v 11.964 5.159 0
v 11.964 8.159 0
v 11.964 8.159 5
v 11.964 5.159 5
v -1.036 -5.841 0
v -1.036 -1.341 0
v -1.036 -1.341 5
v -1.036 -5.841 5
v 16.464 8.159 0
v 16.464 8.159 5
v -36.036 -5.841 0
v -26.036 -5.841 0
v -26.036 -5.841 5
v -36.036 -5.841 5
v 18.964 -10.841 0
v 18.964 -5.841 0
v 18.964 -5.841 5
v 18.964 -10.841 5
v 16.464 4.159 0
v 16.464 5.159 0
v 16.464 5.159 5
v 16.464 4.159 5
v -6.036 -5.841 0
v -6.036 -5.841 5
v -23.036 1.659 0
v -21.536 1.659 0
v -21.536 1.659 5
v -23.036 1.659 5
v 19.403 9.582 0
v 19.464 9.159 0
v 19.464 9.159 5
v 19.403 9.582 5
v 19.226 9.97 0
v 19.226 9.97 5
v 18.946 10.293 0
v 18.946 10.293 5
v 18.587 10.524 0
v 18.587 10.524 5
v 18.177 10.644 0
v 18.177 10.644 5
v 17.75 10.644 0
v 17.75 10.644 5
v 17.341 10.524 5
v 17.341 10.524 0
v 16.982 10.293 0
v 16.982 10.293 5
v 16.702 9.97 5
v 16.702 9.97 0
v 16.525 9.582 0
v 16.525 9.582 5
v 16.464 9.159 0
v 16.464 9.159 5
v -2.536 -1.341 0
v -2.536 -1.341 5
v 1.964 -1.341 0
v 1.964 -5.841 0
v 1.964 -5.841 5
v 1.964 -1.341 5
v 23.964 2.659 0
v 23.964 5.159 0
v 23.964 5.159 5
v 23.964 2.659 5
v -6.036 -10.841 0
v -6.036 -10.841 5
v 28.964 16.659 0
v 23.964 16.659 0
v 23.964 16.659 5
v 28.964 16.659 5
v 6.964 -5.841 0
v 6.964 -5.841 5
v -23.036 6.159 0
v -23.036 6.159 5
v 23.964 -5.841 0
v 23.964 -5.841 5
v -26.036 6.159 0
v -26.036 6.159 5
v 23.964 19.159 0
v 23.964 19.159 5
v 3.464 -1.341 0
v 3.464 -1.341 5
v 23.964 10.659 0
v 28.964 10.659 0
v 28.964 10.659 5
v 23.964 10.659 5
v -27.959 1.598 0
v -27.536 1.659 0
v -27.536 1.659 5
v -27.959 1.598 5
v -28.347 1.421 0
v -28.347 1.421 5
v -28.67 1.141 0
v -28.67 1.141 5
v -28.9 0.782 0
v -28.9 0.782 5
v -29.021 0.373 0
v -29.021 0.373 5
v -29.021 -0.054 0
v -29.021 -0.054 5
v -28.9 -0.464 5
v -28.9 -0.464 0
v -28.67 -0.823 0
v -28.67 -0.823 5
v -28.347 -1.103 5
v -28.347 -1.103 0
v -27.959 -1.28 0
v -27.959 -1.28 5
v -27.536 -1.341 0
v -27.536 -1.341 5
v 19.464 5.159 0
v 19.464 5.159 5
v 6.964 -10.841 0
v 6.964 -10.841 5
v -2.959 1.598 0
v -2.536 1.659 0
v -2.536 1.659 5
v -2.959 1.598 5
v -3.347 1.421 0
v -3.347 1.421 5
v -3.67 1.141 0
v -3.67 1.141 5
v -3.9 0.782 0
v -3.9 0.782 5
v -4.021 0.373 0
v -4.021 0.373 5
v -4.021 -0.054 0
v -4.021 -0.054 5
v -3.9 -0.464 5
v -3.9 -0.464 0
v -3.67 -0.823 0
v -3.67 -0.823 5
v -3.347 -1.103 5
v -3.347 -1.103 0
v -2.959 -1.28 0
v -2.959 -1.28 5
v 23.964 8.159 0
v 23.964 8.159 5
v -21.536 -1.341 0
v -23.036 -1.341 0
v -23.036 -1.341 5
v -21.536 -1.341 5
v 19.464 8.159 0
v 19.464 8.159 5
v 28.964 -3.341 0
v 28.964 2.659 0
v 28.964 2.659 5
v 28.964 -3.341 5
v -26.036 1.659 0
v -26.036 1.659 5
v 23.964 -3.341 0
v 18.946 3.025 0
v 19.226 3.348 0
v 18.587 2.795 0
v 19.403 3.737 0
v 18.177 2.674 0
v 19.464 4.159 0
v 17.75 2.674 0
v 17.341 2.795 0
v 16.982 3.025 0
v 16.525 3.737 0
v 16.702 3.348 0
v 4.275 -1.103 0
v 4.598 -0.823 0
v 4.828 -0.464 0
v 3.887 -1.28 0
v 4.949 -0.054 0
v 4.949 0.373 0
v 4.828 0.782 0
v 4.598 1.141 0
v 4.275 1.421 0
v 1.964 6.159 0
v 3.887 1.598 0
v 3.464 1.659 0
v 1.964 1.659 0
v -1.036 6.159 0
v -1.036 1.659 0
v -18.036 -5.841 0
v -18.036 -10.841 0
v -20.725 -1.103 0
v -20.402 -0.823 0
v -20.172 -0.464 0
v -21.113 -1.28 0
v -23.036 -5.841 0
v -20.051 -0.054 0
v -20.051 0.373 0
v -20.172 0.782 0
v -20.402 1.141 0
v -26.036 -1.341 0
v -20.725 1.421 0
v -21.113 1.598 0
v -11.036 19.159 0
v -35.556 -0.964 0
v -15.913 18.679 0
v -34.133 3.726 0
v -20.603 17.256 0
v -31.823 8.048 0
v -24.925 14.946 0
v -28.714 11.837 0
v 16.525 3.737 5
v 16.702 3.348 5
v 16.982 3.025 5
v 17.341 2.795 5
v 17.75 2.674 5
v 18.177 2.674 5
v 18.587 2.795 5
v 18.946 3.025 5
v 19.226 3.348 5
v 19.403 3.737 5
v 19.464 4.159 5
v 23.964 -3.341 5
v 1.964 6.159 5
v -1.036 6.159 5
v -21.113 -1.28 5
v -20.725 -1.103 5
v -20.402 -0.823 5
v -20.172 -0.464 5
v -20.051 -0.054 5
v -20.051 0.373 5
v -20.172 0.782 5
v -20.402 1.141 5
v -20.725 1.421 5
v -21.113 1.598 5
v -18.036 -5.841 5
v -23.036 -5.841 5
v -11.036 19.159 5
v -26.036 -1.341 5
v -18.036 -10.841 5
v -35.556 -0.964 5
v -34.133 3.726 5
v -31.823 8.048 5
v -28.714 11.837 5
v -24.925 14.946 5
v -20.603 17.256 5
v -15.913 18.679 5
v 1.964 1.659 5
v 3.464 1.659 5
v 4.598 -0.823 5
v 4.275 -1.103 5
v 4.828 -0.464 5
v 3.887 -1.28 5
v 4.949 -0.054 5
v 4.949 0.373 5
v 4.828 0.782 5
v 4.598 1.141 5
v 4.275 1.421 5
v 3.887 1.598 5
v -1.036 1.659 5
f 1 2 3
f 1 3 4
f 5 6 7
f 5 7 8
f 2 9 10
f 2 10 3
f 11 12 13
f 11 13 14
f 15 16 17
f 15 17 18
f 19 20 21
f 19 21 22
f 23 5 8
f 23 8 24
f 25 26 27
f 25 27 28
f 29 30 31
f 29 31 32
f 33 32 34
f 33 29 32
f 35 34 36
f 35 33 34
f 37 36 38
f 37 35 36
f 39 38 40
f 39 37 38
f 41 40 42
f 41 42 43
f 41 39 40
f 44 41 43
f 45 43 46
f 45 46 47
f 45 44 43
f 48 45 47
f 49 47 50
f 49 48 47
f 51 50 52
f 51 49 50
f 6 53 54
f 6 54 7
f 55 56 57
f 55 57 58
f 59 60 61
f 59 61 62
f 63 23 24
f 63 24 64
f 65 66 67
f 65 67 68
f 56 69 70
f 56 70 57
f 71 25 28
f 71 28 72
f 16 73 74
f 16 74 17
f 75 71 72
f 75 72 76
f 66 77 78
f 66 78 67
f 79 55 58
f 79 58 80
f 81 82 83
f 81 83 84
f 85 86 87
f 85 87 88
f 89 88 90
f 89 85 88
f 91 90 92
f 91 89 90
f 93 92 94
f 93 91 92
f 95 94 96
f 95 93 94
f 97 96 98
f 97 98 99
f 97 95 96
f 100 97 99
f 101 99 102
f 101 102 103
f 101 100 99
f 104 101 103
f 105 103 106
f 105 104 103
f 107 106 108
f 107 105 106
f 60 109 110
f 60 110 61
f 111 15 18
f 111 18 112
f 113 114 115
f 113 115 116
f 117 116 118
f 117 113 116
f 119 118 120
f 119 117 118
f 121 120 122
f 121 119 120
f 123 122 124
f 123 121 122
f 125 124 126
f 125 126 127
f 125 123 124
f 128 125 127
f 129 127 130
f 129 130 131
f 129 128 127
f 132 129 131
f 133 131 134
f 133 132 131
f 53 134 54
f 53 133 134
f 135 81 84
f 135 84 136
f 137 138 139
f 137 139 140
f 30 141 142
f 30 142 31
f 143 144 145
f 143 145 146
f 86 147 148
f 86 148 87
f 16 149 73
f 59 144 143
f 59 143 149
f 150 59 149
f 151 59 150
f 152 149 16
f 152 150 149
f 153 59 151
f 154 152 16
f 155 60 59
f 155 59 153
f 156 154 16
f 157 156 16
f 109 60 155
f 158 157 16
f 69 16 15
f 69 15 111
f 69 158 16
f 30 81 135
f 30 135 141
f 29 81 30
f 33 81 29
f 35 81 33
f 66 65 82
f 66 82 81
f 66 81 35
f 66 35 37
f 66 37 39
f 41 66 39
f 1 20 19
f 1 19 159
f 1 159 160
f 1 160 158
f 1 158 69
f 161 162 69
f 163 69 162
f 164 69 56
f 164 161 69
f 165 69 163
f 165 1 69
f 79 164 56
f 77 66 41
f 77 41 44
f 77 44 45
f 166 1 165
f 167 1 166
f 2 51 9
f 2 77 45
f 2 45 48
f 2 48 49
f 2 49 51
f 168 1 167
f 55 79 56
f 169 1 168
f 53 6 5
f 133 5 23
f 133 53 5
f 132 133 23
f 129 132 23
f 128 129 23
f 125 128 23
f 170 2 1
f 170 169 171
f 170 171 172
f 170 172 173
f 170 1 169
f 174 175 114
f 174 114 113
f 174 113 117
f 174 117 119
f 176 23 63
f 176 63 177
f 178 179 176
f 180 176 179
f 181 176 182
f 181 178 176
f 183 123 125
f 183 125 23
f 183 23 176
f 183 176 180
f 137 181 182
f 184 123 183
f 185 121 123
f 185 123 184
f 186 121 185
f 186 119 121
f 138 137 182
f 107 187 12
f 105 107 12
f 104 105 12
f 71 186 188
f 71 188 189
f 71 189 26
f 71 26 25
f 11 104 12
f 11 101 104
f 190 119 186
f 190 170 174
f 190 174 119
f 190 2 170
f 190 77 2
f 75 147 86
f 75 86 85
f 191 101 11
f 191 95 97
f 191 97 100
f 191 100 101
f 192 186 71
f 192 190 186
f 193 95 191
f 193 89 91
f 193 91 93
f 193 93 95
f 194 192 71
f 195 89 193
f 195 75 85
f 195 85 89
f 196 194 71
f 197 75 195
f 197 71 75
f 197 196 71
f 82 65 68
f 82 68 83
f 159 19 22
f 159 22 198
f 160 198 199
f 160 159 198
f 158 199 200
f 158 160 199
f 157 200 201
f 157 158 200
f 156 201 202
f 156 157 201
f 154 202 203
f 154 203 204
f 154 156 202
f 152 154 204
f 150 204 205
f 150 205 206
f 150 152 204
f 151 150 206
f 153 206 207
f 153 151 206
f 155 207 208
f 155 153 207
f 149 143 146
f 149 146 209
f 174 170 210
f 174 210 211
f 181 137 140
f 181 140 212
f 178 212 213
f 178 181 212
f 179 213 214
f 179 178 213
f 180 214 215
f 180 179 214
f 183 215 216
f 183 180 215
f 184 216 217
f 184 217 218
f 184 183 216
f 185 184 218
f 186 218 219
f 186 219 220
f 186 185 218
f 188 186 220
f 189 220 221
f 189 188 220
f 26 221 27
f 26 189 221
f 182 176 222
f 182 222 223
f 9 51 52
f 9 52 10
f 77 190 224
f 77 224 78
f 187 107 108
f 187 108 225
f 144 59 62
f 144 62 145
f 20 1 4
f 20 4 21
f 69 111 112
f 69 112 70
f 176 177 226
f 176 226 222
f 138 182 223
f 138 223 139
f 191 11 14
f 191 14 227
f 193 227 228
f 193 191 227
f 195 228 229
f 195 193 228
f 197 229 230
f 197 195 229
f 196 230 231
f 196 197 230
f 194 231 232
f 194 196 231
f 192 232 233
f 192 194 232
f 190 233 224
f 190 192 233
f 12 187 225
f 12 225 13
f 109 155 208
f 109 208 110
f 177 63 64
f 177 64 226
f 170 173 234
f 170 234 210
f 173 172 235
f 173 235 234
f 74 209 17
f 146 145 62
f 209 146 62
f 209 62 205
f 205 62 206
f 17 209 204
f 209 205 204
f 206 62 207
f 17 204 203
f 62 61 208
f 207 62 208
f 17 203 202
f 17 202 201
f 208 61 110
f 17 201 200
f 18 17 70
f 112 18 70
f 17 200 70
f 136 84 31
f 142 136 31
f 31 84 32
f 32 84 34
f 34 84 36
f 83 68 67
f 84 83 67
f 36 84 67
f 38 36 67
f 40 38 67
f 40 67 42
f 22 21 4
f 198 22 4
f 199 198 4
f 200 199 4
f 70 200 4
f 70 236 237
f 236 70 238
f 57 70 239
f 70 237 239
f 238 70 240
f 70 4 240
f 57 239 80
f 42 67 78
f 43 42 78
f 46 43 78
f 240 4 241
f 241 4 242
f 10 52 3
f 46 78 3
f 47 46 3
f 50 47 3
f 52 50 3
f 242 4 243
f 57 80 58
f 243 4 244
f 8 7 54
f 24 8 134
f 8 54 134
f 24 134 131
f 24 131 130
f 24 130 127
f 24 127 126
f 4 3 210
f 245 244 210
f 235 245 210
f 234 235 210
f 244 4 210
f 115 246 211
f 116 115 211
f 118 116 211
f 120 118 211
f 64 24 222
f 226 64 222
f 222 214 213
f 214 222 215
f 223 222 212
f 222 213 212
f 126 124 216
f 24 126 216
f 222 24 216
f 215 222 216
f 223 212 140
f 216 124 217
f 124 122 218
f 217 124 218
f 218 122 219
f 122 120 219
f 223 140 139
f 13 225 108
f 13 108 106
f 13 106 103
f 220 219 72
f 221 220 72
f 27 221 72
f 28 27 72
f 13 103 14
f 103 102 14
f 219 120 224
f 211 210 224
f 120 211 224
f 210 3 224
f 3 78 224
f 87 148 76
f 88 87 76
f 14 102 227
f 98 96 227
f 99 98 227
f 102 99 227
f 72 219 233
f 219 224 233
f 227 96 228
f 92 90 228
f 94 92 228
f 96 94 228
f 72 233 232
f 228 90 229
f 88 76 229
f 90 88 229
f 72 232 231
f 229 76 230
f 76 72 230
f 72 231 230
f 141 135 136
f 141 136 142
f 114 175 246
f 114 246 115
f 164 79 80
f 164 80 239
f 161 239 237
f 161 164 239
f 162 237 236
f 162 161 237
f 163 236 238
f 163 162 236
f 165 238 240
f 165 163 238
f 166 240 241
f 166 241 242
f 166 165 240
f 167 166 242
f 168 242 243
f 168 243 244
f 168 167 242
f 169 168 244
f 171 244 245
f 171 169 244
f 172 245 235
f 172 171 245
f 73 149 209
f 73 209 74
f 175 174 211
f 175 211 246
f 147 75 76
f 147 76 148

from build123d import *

# Parameters (mm, degrees)
BOSS_EXTRUDE1_DEPTH = 5


with BuildPart() as part:
    # Sketch1 → Boss-Extrude1 (new body)
    with BuildSketch(Plane.XY):
        with BuildLine():
            Line((23.963951988, -5.840885969), (18.963951988, -5.840885969))
            Line((18.963951988, -5.840885969), (18.963951988, -10.840885969))
            Line((18.963951988, -10.840885969), (6.963951988, -10.840885969))
            Line((6.963951988, -10.840885969), (6.963951988, -5.840885969))
            Line((6.963951988, -5.840885969), (1.963951988, -5.840885969))
            Line((1.963951988, -5.840885969), (1.963951988, -1.340885969))
            Line((1.963951988, -1.340885969), (3.463951988, -1.340885969))
            ThreePointArc((3.463951988, -1.340885969), (4.963951988, 0.159114031), (3.463951988, 1.659114031))
            Line((3.463951988, 1.659114031), (1.963951988, 1.659114031))
            Line((1.963951988, 1.659114031), (1.963951988, 6.159114031))
            Line((1.963951988, 6.159114031), (-1.036048012, 6.159114031))
            Line((-1.036048012, 6.159114031), (-1.036048012, 1.659114031))
            Line((-1.036048012, 1.659114031), (-2.536048012, 1.659114031))
            ThreePointArc((-2.536048012, 1.659114031), (-4.036048012, 0.159114031), (-2.536048012, -1.340885969))
            Line((-2.536048012, -1.340885969), (-1.036048012, -1.340885969))
            Line((-1.036048012, -1.340885969), (-1.036048012, -5.840885969))
            Line((-1.036048012, -5.840885969), (-6.036048012, -5.840885969))
            Line((-6.036048012, -5.840885969), (-6.036048012, -10.840885969))
            Line((-6.036048012, -10.840885969), (-18.036048012, -10.840885969))
            Line((-18.036048012, -10.840885969), (-18.036048012, -5.840885969))
            Line((-18.036048012, -5.840885969), (-23.036048012, -5.840885969))
            Line((-23.036048012, -5.840885969), (-23.036048012, -1.340885969))
            Line((-23.036048012, -1.340885969), (-21.536048012, -1.340885969))
            ThreePointArc((-21.536048012, -1.340885969), (-20.036048012, 0.159114031), (-21.536048012, 1.659114031))
            Line((-21.536048012, 1.659114031), (-23.036048012, 1.659114031))
            Line((-23.036048012, 1.659114031), (-23.036048012, 6.159114031))
            Line((-23.036048012, 6.159114031), (-26.036048012, 6.159114031))
            Line((-26.036048012, 6.159114031), (-26.036048012, 1.659114031))
            Line((-26.036048012, 1.659114031), (-27.536048012, 1.659114031))
            ThreePointArc((-27.536048012, 1.659114031), (-29.036048012, 0.159114031), (-27.536048012, -1.340885969))
            Line((-27.536048012, -1.340885969), (-26.036048012, -1.340885969))
            Line((-26.036048012, -1.340885969), (-26.036048012, -5.840885969))
            Line((-26.036048012, -5.840885969), (-36.036048012, -5.840885969))
            ThreePointArc((-36.036048012, -5.840885969), (-28.713717542, 11.836783561), (-11.036048012, 19.159114031))
            Line((-11.036048012, 19.159114031), (23.963951988, 19.159114031))
            Line((23.963951988, 19.159114031), (23.963951988, 16.659114031))
            Line((23.963951988, 16.659114031), (28.963951988, 16.659114031))
            Line((28.963951988, 16.659114031), (28.963951988, 10.659114031))
            Line((28.963951988, 10.659114031), (23.963951988, 10.659114031))
            Line((23.963951988, 10.659114031), (23.963951988, 8.159114031))
            Line((23.963951988, 8.159114031), (19.463951988, 8.159114031))
            Line((19.463951988, 8.159114031), (19.463951988, 9.159114031))
            ThreePointArc((19.463951988, 9.159114031), (17.963951988, 10.659114031), (16.463951988, 9.159114031))
            Line((16.463951988, 9.159114031), (16.463951988, 8.159114031))
            Line((16.463951988, 8.159114031), (11.963951988, 8.159114031))
            Line((11.963951988, 8.159114031), (11.963951988, 5.159114031))
            Line((11.963951988, 5.159114031), (16.463951988, 5.159114031))
            Line((16.463951988, 5.159114031), (16.463951988, 4.159114031))
            ThreePointArc((16.463951988, 4.159114031), (17.963951988, 2.659114031), (19.463951988, 4.159114031))
            Line((19.463951988, 4.159114031), (19.463951988, 5.159114031))
            Line((19.463951988, 5.159114031), (23.963951988, 5.159114031))
            Line((23.963951988, 5.159114031), (23.963951988, 2.659114031))
            Line((23.963951988, 2.659114031), (28.963951988, 2.659114031))
            Line((28.963951988, 2.659114031), (28.963951988, -3.340885969))
            Line((28.963951988, -3.340885969), (23.963951988, -3.340885969))
            Line((23.963951988, -3.340885969), (23.963951988, -5.840885969))
        make_face()
    extrude(amount=BOSS_EXTRUDE1_DEPTH)


solid = part.part
